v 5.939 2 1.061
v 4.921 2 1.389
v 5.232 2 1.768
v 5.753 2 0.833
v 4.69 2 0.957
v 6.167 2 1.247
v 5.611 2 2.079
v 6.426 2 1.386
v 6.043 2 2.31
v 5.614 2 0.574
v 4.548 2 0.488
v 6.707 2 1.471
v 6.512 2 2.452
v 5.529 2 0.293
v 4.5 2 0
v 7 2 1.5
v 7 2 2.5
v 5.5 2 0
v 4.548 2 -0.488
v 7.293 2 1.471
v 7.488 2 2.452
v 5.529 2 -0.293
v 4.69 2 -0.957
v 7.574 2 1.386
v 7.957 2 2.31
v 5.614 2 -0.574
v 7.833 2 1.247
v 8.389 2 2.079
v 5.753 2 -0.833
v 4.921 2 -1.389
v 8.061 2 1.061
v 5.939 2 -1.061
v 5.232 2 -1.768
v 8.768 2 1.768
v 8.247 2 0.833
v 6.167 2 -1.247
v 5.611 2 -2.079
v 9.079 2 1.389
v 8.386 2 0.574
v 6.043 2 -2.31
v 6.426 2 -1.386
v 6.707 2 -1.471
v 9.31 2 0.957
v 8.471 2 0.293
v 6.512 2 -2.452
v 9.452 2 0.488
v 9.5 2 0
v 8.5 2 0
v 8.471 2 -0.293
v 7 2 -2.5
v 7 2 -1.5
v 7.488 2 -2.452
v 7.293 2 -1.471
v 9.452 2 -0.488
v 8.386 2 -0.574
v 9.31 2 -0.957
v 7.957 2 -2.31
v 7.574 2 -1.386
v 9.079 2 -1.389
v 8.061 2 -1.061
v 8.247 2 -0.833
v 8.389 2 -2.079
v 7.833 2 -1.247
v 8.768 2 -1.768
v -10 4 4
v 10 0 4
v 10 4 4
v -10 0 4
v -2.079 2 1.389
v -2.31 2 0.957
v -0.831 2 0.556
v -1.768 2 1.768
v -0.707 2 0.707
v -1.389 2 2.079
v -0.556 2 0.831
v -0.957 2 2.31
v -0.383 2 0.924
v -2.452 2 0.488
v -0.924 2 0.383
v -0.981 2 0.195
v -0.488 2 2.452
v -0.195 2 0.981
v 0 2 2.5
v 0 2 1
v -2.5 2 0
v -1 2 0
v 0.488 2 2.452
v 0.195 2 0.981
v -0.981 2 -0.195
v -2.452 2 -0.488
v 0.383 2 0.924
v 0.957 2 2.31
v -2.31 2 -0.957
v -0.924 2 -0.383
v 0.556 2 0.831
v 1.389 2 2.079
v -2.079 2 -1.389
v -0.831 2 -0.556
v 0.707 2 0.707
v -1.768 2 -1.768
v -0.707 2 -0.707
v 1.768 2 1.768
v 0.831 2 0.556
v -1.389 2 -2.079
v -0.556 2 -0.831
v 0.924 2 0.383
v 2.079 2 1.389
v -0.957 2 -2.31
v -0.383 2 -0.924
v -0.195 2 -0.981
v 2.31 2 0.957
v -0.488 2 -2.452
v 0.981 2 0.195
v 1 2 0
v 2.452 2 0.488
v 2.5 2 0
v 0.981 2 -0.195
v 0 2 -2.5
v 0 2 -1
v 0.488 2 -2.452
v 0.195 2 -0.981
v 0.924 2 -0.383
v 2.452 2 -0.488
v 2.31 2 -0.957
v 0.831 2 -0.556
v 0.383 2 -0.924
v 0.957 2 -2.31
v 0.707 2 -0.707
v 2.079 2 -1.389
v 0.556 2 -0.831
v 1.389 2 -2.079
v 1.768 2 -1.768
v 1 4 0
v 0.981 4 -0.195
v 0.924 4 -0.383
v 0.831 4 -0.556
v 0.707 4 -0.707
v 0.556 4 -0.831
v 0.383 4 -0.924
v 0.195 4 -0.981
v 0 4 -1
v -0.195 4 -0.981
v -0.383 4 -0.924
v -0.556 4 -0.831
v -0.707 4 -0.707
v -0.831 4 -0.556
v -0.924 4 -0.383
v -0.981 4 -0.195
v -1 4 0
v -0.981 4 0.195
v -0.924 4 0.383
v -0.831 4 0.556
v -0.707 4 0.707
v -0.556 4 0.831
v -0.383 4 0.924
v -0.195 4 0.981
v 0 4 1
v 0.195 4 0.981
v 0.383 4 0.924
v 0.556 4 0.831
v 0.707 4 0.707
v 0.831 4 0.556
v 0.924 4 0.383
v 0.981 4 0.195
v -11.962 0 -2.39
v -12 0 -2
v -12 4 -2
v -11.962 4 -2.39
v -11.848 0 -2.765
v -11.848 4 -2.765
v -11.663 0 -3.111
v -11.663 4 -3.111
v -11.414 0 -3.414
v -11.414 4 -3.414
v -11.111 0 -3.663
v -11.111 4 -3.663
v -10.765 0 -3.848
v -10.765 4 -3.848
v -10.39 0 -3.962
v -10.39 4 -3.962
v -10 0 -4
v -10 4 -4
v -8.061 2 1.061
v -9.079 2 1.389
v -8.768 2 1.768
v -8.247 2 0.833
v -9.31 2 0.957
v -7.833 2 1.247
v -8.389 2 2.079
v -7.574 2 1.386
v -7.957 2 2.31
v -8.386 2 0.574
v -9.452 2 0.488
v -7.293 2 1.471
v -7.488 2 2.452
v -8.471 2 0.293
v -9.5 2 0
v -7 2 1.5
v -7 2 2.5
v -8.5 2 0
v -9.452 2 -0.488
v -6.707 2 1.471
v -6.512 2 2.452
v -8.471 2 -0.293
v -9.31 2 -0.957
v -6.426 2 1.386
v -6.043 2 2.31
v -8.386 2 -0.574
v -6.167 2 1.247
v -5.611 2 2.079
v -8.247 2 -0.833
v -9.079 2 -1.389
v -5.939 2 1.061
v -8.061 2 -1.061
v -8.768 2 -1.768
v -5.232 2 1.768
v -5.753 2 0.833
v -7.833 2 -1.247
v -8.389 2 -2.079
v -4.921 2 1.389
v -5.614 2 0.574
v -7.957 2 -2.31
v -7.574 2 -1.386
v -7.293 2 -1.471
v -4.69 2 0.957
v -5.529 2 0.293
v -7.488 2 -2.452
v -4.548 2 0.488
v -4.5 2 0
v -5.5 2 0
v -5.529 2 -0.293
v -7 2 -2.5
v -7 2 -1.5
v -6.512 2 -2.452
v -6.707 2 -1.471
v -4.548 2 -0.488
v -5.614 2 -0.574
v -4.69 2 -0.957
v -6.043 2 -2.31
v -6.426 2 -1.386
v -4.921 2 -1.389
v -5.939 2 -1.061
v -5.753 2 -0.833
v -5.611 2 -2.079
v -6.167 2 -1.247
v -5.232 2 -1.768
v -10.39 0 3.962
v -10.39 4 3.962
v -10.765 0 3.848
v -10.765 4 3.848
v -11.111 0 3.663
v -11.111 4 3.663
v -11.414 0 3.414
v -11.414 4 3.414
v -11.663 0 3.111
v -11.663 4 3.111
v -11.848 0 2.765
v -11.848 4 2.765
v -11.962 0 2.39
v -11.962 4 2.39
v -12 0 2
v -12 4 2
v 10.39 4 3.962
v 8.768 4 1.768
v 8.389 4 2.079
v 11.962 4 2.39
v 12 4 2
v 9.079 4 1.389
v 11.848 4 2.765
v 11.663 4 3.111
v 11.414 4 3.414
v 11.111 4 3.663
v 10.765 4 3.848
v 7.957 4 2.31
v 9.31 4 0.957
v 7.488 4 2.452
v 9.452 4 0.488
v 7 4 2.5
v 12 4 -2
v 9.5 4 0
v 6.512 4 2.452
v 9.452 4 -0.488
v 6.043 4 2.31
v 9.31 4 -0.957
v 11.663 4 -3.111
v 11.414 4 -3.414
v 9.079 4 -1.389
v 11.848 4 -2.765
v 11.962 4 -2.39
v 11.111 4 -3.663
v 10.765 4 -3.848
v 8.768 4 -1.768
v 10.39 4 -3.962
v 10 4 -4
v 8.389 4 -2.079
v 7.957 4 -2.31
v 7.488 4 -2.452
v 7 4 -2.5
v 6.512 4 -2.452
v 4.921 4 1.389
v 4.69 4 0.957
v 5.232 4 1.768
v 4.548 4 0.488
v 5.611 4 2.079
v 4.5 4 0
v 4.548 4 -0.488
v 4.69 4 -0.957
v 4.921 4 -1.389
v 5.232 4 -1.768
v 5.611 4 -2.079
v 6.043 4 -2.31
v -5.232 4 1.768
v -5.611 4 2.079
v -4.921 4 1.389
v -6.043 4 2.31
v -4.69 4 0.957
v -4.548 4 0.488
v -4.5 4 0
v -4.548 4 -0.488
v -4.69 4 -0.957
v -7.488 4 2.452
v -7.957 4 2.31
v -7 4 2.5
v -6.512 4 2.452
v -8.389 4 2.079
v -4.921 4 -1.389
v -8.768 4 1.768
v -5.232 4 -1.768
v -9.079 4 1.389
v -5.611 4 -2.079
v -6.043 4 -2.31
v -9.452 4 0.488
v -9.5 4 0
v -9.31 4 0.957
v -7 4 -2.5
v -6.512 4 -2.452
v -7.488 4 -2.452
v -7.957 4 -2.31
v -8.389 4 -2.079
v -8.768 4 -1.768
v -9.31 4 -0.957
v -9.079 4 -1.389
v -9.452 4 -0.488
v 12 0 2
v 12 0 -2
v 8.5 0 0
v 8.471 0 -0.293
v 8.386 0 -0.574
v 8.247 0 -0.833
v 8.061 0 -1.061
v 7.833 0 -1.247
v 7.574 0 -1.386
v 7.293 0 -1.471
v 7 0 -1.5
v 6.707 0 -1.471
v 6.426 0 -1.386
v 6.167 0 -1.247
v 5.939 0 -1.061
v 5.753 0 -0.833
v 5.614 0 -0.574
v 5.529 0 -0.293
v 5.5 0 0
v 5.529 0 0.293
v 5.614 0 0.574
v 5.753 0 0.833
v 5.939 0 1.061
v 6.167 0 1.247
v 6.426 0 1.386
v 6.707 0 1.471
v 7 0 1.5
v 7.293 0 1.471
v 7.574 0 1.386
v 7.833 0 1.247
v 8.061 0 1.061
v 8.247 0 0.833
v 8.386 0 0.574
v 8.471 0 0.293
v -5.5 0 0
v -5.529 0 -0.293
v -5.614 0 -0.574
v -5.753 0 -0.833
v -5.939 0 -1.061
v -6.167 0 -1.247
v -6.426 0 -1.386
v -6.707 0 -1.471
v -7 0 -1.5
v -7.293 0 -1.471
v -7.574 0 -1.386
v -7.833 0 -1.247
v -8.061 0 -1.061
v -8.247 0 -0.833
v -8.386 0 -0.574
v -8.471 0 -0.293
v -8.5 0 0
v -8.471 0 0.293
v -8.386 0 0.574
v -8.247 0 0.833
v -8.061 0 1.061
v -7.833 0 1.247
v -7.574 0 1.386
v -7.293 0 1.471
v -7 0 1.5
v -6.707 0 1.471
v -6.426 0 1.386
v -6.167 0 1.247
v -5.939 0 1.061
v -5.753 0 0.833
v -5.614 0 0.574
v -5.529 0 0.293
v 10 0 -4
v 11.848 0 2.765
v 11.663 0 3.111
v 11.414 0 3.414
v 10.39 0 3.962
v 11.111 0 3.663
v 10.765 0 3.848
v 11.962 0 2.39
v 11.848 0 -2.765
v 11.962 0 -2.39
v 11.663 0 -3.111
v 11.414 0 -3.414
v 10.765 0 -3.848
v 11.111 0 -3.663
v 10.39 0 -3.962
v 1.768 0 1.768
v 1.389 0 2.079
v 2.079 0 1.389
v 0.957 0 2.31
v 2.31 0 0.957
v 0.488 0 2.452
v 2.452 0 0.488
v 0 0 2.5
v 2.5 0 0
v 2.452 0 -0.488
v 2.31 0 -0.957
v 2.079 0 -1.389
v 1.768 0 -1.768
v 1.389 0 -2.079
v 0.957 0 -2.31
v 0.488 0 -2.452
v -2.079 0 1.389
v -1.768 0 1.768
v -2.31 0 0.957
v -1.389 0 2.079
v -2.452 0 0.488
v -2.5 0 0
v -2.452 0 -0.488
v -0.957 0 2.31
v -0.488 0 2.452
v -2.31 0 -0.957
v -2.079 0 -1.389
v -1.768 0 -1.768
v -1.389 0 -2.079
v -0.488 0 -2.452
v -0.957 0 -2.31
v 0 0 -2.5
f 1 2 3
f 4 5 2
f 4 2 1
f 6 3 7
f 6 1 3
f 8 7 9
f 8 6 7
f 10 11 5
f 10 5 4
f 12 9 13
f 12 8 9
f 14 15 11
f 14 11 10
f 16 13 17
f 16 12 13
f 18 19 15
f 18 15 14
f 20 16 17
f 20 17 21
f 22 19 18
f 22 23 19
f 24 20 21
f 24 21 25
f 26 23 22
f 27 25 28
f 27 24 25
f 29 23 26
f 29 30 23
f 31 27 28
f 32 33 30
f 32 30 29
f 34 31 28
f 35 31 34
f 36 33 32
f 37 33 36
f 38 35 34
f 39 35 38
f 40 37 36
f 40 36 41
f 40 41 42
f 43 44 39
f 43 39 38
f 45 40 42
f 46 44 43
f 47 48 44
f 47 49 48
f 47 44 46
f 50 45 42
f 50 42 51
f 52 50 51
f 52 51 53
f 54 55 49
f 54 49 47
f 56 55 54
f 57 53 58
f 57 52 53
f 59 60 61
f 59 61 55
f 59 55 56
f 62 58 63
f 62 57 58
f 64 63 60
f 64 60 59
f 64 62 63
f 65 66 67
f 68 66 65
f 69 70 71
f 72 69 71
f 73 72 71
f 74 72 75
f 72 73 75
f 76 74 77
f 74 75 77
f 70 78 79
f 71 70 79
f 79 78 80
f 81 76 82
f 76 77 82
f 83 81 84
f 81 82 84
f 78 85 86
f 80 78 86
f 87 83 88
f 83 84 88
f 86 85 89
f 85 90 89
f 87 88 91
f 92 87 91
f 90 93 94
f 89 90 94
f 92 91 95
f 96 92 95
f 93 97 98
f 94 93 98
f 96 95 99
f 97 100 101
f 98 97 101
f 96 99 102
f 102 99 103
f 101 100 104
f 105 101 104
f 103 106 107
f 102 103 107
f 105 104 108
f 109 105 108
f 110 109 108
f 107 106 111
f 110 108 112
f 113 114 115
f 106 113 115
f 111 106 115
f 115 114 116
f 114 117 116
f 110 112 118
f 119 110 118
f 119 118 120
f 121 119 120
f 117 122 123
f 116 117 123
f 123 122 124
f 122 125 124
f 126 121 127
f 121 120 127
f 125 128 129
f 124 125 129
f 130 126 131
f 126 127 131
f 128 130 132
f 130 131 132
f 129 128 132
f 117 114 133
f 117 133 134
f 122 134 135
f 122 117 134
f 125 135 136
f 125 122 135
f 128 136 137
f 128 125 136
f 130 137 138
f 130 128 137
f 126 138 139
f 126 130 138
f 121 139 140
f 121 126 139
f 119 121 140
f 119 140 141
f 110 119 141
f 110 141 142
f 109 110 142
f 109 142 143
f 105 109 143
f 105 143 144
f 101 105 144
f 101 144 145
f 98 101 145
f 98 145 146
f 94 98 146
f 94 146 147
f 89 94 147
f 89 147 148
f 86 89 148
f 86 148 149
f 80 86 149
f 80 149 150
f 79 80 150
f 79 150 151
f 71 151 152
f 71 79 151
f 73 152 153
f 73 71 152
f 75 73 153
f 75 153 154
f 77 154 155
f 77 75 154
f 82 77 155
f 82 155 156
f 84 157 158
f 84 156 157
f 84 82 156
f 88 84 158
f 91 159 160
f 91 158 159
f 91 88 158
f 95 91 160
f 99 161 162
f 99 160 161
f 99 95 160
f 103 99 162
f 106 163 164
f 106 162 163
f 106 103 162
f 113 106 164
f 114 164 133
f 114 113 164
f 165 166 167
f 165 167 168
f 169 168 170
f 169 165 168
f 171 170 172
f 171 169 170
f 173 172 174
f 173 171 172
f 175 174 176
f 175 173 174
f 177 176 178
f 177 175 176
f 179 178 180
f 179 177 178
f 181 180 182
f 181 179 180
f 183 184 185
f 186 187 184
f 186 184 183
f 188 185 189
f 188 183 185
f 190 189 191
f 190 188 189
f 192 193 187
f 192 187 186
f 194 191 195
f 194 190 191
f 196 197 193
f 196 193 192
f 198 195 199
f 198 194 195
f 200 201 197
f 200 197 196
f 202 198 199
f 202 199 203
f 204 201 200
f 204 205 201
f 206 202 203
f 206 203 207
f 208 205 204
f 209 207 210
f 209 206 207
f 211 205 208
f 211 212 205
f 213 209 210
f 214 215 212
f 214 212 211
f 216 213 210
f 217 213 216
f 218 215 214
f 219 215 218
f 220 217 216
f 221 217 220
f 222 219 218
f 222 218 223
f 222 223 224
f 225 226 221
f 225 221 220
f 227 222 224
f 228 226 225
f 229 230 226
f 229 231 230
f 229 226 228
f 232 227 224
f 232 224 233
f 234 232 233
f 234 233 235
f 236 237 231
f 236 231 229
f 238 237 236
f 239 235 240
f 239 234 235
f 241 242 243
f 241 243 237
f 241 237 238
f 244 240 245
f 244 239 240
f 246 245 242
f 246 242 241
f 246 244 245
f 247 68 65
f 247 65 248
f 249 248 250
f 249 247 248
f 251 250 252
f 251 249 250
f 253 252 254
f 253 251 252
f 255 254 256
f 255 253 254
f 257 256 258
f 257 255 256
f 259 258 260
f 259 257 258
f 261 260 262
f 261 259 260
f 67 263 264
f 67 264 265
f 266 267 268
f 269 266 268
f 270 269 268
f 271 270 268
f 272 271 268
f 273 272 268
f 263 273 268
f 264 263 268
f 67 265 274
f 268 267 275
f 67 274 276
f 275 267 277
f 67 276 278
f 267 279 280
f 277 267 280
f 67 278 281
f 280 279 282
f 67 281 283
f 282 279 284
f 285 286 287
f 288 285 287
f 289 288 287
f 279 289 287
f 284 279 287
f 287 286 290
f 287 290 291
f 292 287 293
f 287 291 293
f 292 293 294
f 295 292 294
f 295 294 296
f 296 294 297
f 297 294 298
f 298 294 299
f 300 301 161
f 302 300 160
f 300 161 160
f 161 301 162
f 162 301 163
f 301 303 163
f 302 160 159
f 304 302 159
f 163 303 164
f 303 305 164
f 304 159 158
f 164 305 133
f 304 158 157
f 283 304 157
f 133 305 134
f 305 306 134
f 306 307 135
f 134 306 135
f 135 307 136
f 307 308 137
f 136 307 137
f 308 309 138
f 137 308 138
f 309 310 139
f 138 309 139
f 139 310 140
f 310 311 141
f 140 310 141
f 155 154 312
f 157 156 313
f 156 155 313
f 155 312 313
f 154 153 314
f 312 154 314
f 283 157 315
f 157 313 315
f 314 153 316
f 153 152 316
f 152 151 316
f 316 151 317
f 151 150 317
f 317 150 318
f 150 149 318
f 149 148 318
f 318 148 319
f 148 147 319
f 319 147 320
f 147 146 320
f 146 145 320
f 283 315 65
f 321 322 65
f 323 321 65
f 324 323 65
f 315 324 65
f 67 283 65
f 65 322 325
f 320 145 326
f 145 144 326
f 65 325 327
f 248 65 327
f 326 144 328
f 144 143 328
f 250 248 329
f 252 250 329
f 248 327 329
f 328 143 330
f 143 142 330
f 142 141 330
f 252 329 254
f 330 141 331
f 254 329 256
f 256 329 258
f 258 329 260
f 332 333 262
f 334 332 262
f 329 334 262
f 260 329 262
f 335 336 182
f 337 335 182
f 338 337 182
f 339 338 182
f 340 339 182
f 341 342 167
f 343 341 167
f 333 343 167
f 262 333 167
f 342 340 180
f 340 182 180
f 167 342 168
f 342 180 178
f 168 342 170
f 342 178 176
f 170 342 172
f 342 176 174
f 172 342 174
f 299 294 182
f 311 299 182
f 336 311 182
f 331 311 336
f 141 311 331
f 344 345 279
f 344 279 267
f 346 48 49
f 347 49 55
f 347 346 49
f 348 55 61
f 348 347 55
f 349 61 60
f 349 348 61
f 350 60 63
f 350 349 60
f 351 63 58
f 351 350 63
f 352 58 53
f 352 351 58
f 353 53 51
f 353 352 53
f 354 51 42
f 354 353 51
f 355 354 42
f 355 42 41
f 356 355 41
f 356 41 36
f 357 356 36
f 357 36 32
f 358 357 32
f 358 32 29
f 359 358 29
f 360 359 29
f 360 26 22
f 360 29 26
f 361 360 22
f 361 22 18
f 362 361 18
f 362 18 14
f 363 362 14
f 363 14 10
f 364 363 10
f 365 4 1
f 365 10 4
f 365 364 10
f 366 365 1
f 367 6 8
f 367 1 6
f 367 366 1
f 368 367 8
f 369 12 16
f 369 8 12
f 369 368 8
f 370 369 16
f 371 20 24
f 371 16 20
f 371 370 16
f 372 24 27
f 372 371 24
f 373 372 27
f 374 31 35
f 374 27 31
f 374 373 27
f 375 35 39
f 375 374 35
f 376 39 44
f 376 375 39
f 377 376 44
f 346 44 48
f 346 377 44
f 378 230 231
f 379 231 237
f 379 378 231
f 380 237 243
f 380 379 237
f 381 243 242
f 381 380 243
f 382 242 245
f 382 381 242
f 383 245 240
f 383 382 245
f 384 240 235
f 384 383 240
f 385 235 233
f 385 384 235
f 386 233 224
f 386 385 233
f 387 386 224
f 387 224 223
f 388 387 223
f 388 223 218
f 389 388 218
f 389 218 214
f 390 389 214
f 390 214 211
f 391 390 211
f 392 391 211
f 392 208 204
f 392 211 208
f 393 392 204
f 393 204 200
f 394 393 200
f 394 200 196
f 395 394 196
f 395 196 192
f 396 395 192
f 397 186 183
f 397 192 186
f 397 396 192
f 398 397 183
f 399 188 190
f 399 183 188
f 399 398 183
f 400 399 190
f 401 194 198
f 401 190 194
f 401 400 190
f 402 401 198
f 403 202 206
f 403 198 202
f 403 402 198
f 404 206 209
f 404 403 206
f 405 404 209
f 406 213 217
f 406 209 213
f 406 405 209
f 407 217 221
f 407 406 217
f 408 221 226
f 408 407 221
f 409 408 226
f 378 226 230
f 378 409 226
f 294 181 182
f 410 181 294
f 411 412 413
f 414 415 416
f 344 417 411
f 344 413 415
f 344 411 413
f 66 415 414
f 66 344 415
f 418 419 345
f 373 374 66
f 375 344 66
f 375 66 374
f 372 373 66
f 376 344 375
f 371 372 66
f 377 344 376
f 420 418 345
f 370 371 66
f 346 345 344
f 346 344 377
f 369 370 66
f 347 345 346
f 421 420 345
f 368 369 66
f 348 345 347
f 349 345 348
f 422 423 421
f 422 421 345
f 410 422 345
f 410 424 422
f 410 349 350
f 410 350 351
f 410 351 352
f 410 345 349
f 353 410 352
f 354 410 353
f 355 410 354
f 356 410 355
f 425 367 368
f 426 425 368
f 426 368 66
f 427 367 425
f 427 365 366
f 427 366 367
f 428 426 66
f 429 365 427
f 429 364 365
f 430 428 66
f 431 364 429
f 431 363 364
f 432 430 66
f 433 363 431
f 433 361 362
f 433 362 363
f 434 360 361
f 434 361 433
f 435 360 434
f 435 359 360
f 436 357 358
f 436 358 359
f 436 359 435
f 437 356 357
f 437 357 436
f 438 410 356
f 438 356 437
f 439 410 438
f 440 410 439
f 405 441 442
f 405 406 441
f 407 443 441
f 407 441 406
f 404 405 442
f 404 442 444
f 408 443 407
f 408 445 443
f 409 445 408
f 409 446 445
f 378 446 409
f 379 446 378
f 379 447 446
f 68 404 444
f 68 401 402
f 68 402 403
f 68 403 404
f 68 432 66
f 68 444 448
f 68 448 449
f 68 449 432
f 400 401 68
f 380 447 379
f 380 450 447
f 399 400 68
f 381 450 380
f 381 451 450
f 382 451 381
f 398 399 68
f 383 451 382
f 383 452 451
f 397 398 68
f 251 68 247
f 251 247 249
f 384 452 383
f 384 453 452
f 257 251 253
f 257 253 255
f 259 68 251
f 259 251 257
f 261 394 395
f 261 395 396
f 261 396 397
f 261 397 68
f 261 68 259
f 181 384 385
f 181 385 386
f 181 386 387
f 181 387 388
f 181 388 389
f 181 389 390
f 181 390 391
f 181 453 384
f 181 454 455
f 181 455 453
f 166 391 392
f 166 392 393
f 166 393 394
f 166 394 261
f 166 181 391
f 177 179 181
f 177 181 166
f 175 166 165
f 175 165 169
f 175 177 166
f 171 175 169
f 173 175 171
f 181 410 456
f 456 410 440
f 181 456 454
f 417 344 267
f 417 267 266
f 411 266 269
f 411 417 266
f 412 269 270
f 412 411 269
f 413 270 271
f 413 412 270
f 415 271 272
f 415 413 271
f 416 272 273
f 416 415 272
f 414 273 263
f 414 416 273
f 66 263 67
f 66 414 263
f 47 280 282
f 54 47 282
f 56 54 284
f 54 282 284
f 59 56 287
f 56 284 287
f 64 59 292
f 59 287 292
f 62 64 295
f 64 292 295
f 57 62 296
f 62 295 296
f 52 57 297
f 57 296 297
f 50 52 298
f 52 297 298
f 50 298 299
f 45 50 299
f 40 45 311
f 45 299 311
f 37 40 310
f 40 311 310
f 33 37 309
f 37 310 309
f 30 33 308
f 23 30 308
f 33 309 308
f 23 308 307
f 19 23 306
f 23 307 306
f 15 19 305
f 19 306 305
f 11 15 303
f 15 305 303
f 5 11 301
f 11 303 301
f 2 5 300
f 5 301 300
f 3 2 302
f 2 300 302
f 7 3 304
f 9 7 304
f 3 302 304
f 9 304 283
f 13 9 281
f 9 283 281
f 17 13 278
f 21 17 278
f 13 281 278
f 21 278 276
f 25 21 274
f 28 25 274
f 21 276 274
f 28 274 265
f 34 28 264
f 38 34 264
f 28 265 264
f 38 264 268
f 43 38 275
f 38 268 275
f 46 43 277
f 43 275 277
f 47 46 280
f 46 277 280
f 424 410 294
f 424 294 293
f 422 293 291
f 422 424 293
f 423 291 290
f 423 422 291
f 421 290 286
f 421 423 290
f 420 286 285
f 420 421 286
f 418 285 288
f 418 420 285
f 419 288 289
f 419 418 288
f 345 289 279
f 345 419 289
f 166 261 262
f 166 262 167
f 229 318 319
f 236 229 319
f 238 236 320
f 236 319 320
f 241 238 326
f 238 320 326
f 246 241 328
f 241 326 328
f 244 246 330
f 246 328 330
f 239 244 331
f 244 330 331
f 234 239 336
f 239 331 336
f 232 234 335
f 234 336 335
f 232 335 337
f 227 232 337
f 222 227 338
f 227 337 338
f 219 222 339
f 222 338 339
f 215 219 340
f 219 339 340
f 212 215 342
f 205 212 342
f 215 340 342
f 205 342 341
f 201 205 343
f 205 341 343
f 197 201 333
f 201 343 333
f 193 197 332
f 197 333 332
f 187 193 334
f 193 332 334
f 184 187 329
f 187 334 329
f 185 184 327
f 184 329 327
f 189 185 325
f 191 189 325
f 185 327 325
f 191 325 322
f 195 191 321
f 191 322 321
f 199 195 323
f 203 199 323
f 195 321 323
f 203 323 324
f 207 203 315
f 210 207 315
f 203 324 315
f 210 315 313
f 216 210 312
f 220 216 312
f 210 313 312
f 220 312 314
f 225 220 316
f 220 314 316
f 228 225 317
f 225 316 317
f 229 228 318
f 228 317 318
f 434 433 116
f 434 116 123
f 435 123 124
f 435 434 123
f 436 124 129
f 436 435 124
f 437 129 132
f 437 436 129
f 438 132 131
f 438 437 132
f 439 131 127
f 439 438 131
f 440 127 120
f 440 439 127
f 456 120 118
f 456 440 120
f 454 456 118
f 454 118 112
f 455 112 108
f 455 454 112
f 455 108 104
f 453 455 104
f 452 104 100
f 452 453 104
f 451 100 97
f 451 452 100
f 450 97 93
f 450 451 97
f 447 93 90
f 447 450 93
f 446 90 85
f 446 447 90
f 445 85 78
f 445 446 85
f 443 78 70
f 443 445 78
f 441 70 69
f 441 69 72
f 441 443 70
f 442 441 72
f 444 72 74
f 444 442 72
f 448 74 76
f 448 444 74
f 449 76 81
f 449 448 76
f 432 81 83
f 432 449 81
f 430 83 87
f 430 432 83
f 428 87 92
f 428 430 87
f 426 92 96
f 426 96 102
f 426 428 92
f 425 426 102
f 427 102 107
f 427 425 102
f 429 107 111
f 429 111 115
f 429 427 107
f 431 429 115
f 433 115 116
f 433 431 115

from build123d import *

# Parameters (mm, degrees)
BOSS_EXTRUDE1_DEPTH = 4
CUT_EXTRUDE1_REACH  = 15.266
SKETCH1_3_R         = 1
SKETCH1_3_R_2       = 1.5
SKETCH1_4_R         = 2.5
CUT_EXTRUDE2_DEPTH  = 2
SKETCH2_R           = 2.5
CUT_EXTRUDE3_DEPTH  = 2


with BuildPart() as part:
    # Sketch1 → Boss-Extrude1 (new body)
    with BuildSketch(Plane(origin=(0, 0, 0), x_dir=(1, 0, 0), z_dir=(0, 1, 0))):
        with BuildLine():
            Line((0, 4), (10, 4))
            ThreePointArc((10, 4), (11.414213562, 3.414213562), (12, 2))
            Line((12, 2), (12, -2))
            ThreePointArc((12, -2), (11.414213562, -3.414213562), (10, -4))
            Line((10, -4), (0, -4))
            Line((0, -4), (-10, -4))
            ThreePointArc((-10, -4), (-11.414213562, -3.414213562), (-12, -2))
            Line((-12, -2), (-12, 2))
            ThreePointArc((-12, 2), (-11.414213562, 3.414213562), (-10, 4))
            Line((-10, 4), (0, 4))
        make_face()
    extrude(amount=BOSS_EXTRUDE1_DEPTH)

    # Sketch1<3> → Cut-Extrude1 (cut, up to next)
    with BuildSketch(Plane(origin=(0, 0, 0), x_dir=(1, 0, 0), z_dir=(0, 1, 0)), mode=Mode.PRIVATE) as cut_extrude1_sk1:
        Circle(SKETCH1_3_R)
    cut_extrude1_tool1 = extrude(cut_extrude1_sk1.sketch, amount=CUT_EXTRUDE1_REACH, mode=Mode.PRIVATE) & part.part
    # Sketch1<3> → Cut-Extrude1 (cut, up to next)
    with BuildSketch(Plane(origin=(0, 0, 0), x_dir=(1, 0, 0), z_dir=(0, 1, 0)), mode=Mode.PRIVATE) as cut_extrude1_sk2:
        with Locations((-7, 0)):
            Circle(SKETCH1_3_R_2)
    cut_extrude1_tool2 = extrude(cut_extrude1_sk2.sketch, amount=CUT_EXTRUDE1_REACH, mode=Mode.PRIVATE) & part.part
    # Sketch1<3> → Cut-Extrude1 (cut, up to next)
    with BuildSketch(Plane(origin=(0, 0, 0), x_dir=(1, 0, 0), z_dir=(0, 1, 0)), mode=Mode.PRIVATE) as cut_extrude1_sk3:
        with Locations((7, 0)):
            Circle(SKETCH1_3_R_2)
    cut_extrude1_tool3 = extrude(cut_extrude1_sk3.sketch, amount=CUT_EXTRUDE1_REACH, mode=Mode.PRIVATE) & part.part
    add(cut_extrude1_tool1.solids().sort_by_distance((0, 0, 0))[0], mode=Mode.SUBTRACT)
    add(cut_extrude1_tool2.solids().sort_by_distance((-7, 0, 0))[0], mode=Mode.SUBTRACT)
    add(cut_extrude1_tool3.solids().sort_by_distance((7, 0, 0))[0], mode=Mode.SUBTRACT)

    # Sketch1<4> → Cut-Extrude2 (cut)
    with BuildSketch(Plane(origin=(0, 0, 0), x_dir=(1, 0, 0), z_dir=(0, 1, 0))):
        Circle(SKETCH1_4_R)
    extrude(amount=CUT_EXTRUDE2_DEPTH, mode=Mode.SUBTRACT)

    # Sketch2 → Cut-Extrude3 (cut)
    with BuildSketch(Plane(origin=(0, 4, 0), x_dir=(1, 0, 0), z_dir=(0, 1, 0))):
        with Locations((-7, 0)):
            Circle(SKETCH2_R)
        with Locations((7, 0)):
            Circle(SKETCH2_R)
    extrude(amount=-CUT_EXTRUDE3_DEPTH, mode=Mode.SUBTRACT)


solid = part.part
